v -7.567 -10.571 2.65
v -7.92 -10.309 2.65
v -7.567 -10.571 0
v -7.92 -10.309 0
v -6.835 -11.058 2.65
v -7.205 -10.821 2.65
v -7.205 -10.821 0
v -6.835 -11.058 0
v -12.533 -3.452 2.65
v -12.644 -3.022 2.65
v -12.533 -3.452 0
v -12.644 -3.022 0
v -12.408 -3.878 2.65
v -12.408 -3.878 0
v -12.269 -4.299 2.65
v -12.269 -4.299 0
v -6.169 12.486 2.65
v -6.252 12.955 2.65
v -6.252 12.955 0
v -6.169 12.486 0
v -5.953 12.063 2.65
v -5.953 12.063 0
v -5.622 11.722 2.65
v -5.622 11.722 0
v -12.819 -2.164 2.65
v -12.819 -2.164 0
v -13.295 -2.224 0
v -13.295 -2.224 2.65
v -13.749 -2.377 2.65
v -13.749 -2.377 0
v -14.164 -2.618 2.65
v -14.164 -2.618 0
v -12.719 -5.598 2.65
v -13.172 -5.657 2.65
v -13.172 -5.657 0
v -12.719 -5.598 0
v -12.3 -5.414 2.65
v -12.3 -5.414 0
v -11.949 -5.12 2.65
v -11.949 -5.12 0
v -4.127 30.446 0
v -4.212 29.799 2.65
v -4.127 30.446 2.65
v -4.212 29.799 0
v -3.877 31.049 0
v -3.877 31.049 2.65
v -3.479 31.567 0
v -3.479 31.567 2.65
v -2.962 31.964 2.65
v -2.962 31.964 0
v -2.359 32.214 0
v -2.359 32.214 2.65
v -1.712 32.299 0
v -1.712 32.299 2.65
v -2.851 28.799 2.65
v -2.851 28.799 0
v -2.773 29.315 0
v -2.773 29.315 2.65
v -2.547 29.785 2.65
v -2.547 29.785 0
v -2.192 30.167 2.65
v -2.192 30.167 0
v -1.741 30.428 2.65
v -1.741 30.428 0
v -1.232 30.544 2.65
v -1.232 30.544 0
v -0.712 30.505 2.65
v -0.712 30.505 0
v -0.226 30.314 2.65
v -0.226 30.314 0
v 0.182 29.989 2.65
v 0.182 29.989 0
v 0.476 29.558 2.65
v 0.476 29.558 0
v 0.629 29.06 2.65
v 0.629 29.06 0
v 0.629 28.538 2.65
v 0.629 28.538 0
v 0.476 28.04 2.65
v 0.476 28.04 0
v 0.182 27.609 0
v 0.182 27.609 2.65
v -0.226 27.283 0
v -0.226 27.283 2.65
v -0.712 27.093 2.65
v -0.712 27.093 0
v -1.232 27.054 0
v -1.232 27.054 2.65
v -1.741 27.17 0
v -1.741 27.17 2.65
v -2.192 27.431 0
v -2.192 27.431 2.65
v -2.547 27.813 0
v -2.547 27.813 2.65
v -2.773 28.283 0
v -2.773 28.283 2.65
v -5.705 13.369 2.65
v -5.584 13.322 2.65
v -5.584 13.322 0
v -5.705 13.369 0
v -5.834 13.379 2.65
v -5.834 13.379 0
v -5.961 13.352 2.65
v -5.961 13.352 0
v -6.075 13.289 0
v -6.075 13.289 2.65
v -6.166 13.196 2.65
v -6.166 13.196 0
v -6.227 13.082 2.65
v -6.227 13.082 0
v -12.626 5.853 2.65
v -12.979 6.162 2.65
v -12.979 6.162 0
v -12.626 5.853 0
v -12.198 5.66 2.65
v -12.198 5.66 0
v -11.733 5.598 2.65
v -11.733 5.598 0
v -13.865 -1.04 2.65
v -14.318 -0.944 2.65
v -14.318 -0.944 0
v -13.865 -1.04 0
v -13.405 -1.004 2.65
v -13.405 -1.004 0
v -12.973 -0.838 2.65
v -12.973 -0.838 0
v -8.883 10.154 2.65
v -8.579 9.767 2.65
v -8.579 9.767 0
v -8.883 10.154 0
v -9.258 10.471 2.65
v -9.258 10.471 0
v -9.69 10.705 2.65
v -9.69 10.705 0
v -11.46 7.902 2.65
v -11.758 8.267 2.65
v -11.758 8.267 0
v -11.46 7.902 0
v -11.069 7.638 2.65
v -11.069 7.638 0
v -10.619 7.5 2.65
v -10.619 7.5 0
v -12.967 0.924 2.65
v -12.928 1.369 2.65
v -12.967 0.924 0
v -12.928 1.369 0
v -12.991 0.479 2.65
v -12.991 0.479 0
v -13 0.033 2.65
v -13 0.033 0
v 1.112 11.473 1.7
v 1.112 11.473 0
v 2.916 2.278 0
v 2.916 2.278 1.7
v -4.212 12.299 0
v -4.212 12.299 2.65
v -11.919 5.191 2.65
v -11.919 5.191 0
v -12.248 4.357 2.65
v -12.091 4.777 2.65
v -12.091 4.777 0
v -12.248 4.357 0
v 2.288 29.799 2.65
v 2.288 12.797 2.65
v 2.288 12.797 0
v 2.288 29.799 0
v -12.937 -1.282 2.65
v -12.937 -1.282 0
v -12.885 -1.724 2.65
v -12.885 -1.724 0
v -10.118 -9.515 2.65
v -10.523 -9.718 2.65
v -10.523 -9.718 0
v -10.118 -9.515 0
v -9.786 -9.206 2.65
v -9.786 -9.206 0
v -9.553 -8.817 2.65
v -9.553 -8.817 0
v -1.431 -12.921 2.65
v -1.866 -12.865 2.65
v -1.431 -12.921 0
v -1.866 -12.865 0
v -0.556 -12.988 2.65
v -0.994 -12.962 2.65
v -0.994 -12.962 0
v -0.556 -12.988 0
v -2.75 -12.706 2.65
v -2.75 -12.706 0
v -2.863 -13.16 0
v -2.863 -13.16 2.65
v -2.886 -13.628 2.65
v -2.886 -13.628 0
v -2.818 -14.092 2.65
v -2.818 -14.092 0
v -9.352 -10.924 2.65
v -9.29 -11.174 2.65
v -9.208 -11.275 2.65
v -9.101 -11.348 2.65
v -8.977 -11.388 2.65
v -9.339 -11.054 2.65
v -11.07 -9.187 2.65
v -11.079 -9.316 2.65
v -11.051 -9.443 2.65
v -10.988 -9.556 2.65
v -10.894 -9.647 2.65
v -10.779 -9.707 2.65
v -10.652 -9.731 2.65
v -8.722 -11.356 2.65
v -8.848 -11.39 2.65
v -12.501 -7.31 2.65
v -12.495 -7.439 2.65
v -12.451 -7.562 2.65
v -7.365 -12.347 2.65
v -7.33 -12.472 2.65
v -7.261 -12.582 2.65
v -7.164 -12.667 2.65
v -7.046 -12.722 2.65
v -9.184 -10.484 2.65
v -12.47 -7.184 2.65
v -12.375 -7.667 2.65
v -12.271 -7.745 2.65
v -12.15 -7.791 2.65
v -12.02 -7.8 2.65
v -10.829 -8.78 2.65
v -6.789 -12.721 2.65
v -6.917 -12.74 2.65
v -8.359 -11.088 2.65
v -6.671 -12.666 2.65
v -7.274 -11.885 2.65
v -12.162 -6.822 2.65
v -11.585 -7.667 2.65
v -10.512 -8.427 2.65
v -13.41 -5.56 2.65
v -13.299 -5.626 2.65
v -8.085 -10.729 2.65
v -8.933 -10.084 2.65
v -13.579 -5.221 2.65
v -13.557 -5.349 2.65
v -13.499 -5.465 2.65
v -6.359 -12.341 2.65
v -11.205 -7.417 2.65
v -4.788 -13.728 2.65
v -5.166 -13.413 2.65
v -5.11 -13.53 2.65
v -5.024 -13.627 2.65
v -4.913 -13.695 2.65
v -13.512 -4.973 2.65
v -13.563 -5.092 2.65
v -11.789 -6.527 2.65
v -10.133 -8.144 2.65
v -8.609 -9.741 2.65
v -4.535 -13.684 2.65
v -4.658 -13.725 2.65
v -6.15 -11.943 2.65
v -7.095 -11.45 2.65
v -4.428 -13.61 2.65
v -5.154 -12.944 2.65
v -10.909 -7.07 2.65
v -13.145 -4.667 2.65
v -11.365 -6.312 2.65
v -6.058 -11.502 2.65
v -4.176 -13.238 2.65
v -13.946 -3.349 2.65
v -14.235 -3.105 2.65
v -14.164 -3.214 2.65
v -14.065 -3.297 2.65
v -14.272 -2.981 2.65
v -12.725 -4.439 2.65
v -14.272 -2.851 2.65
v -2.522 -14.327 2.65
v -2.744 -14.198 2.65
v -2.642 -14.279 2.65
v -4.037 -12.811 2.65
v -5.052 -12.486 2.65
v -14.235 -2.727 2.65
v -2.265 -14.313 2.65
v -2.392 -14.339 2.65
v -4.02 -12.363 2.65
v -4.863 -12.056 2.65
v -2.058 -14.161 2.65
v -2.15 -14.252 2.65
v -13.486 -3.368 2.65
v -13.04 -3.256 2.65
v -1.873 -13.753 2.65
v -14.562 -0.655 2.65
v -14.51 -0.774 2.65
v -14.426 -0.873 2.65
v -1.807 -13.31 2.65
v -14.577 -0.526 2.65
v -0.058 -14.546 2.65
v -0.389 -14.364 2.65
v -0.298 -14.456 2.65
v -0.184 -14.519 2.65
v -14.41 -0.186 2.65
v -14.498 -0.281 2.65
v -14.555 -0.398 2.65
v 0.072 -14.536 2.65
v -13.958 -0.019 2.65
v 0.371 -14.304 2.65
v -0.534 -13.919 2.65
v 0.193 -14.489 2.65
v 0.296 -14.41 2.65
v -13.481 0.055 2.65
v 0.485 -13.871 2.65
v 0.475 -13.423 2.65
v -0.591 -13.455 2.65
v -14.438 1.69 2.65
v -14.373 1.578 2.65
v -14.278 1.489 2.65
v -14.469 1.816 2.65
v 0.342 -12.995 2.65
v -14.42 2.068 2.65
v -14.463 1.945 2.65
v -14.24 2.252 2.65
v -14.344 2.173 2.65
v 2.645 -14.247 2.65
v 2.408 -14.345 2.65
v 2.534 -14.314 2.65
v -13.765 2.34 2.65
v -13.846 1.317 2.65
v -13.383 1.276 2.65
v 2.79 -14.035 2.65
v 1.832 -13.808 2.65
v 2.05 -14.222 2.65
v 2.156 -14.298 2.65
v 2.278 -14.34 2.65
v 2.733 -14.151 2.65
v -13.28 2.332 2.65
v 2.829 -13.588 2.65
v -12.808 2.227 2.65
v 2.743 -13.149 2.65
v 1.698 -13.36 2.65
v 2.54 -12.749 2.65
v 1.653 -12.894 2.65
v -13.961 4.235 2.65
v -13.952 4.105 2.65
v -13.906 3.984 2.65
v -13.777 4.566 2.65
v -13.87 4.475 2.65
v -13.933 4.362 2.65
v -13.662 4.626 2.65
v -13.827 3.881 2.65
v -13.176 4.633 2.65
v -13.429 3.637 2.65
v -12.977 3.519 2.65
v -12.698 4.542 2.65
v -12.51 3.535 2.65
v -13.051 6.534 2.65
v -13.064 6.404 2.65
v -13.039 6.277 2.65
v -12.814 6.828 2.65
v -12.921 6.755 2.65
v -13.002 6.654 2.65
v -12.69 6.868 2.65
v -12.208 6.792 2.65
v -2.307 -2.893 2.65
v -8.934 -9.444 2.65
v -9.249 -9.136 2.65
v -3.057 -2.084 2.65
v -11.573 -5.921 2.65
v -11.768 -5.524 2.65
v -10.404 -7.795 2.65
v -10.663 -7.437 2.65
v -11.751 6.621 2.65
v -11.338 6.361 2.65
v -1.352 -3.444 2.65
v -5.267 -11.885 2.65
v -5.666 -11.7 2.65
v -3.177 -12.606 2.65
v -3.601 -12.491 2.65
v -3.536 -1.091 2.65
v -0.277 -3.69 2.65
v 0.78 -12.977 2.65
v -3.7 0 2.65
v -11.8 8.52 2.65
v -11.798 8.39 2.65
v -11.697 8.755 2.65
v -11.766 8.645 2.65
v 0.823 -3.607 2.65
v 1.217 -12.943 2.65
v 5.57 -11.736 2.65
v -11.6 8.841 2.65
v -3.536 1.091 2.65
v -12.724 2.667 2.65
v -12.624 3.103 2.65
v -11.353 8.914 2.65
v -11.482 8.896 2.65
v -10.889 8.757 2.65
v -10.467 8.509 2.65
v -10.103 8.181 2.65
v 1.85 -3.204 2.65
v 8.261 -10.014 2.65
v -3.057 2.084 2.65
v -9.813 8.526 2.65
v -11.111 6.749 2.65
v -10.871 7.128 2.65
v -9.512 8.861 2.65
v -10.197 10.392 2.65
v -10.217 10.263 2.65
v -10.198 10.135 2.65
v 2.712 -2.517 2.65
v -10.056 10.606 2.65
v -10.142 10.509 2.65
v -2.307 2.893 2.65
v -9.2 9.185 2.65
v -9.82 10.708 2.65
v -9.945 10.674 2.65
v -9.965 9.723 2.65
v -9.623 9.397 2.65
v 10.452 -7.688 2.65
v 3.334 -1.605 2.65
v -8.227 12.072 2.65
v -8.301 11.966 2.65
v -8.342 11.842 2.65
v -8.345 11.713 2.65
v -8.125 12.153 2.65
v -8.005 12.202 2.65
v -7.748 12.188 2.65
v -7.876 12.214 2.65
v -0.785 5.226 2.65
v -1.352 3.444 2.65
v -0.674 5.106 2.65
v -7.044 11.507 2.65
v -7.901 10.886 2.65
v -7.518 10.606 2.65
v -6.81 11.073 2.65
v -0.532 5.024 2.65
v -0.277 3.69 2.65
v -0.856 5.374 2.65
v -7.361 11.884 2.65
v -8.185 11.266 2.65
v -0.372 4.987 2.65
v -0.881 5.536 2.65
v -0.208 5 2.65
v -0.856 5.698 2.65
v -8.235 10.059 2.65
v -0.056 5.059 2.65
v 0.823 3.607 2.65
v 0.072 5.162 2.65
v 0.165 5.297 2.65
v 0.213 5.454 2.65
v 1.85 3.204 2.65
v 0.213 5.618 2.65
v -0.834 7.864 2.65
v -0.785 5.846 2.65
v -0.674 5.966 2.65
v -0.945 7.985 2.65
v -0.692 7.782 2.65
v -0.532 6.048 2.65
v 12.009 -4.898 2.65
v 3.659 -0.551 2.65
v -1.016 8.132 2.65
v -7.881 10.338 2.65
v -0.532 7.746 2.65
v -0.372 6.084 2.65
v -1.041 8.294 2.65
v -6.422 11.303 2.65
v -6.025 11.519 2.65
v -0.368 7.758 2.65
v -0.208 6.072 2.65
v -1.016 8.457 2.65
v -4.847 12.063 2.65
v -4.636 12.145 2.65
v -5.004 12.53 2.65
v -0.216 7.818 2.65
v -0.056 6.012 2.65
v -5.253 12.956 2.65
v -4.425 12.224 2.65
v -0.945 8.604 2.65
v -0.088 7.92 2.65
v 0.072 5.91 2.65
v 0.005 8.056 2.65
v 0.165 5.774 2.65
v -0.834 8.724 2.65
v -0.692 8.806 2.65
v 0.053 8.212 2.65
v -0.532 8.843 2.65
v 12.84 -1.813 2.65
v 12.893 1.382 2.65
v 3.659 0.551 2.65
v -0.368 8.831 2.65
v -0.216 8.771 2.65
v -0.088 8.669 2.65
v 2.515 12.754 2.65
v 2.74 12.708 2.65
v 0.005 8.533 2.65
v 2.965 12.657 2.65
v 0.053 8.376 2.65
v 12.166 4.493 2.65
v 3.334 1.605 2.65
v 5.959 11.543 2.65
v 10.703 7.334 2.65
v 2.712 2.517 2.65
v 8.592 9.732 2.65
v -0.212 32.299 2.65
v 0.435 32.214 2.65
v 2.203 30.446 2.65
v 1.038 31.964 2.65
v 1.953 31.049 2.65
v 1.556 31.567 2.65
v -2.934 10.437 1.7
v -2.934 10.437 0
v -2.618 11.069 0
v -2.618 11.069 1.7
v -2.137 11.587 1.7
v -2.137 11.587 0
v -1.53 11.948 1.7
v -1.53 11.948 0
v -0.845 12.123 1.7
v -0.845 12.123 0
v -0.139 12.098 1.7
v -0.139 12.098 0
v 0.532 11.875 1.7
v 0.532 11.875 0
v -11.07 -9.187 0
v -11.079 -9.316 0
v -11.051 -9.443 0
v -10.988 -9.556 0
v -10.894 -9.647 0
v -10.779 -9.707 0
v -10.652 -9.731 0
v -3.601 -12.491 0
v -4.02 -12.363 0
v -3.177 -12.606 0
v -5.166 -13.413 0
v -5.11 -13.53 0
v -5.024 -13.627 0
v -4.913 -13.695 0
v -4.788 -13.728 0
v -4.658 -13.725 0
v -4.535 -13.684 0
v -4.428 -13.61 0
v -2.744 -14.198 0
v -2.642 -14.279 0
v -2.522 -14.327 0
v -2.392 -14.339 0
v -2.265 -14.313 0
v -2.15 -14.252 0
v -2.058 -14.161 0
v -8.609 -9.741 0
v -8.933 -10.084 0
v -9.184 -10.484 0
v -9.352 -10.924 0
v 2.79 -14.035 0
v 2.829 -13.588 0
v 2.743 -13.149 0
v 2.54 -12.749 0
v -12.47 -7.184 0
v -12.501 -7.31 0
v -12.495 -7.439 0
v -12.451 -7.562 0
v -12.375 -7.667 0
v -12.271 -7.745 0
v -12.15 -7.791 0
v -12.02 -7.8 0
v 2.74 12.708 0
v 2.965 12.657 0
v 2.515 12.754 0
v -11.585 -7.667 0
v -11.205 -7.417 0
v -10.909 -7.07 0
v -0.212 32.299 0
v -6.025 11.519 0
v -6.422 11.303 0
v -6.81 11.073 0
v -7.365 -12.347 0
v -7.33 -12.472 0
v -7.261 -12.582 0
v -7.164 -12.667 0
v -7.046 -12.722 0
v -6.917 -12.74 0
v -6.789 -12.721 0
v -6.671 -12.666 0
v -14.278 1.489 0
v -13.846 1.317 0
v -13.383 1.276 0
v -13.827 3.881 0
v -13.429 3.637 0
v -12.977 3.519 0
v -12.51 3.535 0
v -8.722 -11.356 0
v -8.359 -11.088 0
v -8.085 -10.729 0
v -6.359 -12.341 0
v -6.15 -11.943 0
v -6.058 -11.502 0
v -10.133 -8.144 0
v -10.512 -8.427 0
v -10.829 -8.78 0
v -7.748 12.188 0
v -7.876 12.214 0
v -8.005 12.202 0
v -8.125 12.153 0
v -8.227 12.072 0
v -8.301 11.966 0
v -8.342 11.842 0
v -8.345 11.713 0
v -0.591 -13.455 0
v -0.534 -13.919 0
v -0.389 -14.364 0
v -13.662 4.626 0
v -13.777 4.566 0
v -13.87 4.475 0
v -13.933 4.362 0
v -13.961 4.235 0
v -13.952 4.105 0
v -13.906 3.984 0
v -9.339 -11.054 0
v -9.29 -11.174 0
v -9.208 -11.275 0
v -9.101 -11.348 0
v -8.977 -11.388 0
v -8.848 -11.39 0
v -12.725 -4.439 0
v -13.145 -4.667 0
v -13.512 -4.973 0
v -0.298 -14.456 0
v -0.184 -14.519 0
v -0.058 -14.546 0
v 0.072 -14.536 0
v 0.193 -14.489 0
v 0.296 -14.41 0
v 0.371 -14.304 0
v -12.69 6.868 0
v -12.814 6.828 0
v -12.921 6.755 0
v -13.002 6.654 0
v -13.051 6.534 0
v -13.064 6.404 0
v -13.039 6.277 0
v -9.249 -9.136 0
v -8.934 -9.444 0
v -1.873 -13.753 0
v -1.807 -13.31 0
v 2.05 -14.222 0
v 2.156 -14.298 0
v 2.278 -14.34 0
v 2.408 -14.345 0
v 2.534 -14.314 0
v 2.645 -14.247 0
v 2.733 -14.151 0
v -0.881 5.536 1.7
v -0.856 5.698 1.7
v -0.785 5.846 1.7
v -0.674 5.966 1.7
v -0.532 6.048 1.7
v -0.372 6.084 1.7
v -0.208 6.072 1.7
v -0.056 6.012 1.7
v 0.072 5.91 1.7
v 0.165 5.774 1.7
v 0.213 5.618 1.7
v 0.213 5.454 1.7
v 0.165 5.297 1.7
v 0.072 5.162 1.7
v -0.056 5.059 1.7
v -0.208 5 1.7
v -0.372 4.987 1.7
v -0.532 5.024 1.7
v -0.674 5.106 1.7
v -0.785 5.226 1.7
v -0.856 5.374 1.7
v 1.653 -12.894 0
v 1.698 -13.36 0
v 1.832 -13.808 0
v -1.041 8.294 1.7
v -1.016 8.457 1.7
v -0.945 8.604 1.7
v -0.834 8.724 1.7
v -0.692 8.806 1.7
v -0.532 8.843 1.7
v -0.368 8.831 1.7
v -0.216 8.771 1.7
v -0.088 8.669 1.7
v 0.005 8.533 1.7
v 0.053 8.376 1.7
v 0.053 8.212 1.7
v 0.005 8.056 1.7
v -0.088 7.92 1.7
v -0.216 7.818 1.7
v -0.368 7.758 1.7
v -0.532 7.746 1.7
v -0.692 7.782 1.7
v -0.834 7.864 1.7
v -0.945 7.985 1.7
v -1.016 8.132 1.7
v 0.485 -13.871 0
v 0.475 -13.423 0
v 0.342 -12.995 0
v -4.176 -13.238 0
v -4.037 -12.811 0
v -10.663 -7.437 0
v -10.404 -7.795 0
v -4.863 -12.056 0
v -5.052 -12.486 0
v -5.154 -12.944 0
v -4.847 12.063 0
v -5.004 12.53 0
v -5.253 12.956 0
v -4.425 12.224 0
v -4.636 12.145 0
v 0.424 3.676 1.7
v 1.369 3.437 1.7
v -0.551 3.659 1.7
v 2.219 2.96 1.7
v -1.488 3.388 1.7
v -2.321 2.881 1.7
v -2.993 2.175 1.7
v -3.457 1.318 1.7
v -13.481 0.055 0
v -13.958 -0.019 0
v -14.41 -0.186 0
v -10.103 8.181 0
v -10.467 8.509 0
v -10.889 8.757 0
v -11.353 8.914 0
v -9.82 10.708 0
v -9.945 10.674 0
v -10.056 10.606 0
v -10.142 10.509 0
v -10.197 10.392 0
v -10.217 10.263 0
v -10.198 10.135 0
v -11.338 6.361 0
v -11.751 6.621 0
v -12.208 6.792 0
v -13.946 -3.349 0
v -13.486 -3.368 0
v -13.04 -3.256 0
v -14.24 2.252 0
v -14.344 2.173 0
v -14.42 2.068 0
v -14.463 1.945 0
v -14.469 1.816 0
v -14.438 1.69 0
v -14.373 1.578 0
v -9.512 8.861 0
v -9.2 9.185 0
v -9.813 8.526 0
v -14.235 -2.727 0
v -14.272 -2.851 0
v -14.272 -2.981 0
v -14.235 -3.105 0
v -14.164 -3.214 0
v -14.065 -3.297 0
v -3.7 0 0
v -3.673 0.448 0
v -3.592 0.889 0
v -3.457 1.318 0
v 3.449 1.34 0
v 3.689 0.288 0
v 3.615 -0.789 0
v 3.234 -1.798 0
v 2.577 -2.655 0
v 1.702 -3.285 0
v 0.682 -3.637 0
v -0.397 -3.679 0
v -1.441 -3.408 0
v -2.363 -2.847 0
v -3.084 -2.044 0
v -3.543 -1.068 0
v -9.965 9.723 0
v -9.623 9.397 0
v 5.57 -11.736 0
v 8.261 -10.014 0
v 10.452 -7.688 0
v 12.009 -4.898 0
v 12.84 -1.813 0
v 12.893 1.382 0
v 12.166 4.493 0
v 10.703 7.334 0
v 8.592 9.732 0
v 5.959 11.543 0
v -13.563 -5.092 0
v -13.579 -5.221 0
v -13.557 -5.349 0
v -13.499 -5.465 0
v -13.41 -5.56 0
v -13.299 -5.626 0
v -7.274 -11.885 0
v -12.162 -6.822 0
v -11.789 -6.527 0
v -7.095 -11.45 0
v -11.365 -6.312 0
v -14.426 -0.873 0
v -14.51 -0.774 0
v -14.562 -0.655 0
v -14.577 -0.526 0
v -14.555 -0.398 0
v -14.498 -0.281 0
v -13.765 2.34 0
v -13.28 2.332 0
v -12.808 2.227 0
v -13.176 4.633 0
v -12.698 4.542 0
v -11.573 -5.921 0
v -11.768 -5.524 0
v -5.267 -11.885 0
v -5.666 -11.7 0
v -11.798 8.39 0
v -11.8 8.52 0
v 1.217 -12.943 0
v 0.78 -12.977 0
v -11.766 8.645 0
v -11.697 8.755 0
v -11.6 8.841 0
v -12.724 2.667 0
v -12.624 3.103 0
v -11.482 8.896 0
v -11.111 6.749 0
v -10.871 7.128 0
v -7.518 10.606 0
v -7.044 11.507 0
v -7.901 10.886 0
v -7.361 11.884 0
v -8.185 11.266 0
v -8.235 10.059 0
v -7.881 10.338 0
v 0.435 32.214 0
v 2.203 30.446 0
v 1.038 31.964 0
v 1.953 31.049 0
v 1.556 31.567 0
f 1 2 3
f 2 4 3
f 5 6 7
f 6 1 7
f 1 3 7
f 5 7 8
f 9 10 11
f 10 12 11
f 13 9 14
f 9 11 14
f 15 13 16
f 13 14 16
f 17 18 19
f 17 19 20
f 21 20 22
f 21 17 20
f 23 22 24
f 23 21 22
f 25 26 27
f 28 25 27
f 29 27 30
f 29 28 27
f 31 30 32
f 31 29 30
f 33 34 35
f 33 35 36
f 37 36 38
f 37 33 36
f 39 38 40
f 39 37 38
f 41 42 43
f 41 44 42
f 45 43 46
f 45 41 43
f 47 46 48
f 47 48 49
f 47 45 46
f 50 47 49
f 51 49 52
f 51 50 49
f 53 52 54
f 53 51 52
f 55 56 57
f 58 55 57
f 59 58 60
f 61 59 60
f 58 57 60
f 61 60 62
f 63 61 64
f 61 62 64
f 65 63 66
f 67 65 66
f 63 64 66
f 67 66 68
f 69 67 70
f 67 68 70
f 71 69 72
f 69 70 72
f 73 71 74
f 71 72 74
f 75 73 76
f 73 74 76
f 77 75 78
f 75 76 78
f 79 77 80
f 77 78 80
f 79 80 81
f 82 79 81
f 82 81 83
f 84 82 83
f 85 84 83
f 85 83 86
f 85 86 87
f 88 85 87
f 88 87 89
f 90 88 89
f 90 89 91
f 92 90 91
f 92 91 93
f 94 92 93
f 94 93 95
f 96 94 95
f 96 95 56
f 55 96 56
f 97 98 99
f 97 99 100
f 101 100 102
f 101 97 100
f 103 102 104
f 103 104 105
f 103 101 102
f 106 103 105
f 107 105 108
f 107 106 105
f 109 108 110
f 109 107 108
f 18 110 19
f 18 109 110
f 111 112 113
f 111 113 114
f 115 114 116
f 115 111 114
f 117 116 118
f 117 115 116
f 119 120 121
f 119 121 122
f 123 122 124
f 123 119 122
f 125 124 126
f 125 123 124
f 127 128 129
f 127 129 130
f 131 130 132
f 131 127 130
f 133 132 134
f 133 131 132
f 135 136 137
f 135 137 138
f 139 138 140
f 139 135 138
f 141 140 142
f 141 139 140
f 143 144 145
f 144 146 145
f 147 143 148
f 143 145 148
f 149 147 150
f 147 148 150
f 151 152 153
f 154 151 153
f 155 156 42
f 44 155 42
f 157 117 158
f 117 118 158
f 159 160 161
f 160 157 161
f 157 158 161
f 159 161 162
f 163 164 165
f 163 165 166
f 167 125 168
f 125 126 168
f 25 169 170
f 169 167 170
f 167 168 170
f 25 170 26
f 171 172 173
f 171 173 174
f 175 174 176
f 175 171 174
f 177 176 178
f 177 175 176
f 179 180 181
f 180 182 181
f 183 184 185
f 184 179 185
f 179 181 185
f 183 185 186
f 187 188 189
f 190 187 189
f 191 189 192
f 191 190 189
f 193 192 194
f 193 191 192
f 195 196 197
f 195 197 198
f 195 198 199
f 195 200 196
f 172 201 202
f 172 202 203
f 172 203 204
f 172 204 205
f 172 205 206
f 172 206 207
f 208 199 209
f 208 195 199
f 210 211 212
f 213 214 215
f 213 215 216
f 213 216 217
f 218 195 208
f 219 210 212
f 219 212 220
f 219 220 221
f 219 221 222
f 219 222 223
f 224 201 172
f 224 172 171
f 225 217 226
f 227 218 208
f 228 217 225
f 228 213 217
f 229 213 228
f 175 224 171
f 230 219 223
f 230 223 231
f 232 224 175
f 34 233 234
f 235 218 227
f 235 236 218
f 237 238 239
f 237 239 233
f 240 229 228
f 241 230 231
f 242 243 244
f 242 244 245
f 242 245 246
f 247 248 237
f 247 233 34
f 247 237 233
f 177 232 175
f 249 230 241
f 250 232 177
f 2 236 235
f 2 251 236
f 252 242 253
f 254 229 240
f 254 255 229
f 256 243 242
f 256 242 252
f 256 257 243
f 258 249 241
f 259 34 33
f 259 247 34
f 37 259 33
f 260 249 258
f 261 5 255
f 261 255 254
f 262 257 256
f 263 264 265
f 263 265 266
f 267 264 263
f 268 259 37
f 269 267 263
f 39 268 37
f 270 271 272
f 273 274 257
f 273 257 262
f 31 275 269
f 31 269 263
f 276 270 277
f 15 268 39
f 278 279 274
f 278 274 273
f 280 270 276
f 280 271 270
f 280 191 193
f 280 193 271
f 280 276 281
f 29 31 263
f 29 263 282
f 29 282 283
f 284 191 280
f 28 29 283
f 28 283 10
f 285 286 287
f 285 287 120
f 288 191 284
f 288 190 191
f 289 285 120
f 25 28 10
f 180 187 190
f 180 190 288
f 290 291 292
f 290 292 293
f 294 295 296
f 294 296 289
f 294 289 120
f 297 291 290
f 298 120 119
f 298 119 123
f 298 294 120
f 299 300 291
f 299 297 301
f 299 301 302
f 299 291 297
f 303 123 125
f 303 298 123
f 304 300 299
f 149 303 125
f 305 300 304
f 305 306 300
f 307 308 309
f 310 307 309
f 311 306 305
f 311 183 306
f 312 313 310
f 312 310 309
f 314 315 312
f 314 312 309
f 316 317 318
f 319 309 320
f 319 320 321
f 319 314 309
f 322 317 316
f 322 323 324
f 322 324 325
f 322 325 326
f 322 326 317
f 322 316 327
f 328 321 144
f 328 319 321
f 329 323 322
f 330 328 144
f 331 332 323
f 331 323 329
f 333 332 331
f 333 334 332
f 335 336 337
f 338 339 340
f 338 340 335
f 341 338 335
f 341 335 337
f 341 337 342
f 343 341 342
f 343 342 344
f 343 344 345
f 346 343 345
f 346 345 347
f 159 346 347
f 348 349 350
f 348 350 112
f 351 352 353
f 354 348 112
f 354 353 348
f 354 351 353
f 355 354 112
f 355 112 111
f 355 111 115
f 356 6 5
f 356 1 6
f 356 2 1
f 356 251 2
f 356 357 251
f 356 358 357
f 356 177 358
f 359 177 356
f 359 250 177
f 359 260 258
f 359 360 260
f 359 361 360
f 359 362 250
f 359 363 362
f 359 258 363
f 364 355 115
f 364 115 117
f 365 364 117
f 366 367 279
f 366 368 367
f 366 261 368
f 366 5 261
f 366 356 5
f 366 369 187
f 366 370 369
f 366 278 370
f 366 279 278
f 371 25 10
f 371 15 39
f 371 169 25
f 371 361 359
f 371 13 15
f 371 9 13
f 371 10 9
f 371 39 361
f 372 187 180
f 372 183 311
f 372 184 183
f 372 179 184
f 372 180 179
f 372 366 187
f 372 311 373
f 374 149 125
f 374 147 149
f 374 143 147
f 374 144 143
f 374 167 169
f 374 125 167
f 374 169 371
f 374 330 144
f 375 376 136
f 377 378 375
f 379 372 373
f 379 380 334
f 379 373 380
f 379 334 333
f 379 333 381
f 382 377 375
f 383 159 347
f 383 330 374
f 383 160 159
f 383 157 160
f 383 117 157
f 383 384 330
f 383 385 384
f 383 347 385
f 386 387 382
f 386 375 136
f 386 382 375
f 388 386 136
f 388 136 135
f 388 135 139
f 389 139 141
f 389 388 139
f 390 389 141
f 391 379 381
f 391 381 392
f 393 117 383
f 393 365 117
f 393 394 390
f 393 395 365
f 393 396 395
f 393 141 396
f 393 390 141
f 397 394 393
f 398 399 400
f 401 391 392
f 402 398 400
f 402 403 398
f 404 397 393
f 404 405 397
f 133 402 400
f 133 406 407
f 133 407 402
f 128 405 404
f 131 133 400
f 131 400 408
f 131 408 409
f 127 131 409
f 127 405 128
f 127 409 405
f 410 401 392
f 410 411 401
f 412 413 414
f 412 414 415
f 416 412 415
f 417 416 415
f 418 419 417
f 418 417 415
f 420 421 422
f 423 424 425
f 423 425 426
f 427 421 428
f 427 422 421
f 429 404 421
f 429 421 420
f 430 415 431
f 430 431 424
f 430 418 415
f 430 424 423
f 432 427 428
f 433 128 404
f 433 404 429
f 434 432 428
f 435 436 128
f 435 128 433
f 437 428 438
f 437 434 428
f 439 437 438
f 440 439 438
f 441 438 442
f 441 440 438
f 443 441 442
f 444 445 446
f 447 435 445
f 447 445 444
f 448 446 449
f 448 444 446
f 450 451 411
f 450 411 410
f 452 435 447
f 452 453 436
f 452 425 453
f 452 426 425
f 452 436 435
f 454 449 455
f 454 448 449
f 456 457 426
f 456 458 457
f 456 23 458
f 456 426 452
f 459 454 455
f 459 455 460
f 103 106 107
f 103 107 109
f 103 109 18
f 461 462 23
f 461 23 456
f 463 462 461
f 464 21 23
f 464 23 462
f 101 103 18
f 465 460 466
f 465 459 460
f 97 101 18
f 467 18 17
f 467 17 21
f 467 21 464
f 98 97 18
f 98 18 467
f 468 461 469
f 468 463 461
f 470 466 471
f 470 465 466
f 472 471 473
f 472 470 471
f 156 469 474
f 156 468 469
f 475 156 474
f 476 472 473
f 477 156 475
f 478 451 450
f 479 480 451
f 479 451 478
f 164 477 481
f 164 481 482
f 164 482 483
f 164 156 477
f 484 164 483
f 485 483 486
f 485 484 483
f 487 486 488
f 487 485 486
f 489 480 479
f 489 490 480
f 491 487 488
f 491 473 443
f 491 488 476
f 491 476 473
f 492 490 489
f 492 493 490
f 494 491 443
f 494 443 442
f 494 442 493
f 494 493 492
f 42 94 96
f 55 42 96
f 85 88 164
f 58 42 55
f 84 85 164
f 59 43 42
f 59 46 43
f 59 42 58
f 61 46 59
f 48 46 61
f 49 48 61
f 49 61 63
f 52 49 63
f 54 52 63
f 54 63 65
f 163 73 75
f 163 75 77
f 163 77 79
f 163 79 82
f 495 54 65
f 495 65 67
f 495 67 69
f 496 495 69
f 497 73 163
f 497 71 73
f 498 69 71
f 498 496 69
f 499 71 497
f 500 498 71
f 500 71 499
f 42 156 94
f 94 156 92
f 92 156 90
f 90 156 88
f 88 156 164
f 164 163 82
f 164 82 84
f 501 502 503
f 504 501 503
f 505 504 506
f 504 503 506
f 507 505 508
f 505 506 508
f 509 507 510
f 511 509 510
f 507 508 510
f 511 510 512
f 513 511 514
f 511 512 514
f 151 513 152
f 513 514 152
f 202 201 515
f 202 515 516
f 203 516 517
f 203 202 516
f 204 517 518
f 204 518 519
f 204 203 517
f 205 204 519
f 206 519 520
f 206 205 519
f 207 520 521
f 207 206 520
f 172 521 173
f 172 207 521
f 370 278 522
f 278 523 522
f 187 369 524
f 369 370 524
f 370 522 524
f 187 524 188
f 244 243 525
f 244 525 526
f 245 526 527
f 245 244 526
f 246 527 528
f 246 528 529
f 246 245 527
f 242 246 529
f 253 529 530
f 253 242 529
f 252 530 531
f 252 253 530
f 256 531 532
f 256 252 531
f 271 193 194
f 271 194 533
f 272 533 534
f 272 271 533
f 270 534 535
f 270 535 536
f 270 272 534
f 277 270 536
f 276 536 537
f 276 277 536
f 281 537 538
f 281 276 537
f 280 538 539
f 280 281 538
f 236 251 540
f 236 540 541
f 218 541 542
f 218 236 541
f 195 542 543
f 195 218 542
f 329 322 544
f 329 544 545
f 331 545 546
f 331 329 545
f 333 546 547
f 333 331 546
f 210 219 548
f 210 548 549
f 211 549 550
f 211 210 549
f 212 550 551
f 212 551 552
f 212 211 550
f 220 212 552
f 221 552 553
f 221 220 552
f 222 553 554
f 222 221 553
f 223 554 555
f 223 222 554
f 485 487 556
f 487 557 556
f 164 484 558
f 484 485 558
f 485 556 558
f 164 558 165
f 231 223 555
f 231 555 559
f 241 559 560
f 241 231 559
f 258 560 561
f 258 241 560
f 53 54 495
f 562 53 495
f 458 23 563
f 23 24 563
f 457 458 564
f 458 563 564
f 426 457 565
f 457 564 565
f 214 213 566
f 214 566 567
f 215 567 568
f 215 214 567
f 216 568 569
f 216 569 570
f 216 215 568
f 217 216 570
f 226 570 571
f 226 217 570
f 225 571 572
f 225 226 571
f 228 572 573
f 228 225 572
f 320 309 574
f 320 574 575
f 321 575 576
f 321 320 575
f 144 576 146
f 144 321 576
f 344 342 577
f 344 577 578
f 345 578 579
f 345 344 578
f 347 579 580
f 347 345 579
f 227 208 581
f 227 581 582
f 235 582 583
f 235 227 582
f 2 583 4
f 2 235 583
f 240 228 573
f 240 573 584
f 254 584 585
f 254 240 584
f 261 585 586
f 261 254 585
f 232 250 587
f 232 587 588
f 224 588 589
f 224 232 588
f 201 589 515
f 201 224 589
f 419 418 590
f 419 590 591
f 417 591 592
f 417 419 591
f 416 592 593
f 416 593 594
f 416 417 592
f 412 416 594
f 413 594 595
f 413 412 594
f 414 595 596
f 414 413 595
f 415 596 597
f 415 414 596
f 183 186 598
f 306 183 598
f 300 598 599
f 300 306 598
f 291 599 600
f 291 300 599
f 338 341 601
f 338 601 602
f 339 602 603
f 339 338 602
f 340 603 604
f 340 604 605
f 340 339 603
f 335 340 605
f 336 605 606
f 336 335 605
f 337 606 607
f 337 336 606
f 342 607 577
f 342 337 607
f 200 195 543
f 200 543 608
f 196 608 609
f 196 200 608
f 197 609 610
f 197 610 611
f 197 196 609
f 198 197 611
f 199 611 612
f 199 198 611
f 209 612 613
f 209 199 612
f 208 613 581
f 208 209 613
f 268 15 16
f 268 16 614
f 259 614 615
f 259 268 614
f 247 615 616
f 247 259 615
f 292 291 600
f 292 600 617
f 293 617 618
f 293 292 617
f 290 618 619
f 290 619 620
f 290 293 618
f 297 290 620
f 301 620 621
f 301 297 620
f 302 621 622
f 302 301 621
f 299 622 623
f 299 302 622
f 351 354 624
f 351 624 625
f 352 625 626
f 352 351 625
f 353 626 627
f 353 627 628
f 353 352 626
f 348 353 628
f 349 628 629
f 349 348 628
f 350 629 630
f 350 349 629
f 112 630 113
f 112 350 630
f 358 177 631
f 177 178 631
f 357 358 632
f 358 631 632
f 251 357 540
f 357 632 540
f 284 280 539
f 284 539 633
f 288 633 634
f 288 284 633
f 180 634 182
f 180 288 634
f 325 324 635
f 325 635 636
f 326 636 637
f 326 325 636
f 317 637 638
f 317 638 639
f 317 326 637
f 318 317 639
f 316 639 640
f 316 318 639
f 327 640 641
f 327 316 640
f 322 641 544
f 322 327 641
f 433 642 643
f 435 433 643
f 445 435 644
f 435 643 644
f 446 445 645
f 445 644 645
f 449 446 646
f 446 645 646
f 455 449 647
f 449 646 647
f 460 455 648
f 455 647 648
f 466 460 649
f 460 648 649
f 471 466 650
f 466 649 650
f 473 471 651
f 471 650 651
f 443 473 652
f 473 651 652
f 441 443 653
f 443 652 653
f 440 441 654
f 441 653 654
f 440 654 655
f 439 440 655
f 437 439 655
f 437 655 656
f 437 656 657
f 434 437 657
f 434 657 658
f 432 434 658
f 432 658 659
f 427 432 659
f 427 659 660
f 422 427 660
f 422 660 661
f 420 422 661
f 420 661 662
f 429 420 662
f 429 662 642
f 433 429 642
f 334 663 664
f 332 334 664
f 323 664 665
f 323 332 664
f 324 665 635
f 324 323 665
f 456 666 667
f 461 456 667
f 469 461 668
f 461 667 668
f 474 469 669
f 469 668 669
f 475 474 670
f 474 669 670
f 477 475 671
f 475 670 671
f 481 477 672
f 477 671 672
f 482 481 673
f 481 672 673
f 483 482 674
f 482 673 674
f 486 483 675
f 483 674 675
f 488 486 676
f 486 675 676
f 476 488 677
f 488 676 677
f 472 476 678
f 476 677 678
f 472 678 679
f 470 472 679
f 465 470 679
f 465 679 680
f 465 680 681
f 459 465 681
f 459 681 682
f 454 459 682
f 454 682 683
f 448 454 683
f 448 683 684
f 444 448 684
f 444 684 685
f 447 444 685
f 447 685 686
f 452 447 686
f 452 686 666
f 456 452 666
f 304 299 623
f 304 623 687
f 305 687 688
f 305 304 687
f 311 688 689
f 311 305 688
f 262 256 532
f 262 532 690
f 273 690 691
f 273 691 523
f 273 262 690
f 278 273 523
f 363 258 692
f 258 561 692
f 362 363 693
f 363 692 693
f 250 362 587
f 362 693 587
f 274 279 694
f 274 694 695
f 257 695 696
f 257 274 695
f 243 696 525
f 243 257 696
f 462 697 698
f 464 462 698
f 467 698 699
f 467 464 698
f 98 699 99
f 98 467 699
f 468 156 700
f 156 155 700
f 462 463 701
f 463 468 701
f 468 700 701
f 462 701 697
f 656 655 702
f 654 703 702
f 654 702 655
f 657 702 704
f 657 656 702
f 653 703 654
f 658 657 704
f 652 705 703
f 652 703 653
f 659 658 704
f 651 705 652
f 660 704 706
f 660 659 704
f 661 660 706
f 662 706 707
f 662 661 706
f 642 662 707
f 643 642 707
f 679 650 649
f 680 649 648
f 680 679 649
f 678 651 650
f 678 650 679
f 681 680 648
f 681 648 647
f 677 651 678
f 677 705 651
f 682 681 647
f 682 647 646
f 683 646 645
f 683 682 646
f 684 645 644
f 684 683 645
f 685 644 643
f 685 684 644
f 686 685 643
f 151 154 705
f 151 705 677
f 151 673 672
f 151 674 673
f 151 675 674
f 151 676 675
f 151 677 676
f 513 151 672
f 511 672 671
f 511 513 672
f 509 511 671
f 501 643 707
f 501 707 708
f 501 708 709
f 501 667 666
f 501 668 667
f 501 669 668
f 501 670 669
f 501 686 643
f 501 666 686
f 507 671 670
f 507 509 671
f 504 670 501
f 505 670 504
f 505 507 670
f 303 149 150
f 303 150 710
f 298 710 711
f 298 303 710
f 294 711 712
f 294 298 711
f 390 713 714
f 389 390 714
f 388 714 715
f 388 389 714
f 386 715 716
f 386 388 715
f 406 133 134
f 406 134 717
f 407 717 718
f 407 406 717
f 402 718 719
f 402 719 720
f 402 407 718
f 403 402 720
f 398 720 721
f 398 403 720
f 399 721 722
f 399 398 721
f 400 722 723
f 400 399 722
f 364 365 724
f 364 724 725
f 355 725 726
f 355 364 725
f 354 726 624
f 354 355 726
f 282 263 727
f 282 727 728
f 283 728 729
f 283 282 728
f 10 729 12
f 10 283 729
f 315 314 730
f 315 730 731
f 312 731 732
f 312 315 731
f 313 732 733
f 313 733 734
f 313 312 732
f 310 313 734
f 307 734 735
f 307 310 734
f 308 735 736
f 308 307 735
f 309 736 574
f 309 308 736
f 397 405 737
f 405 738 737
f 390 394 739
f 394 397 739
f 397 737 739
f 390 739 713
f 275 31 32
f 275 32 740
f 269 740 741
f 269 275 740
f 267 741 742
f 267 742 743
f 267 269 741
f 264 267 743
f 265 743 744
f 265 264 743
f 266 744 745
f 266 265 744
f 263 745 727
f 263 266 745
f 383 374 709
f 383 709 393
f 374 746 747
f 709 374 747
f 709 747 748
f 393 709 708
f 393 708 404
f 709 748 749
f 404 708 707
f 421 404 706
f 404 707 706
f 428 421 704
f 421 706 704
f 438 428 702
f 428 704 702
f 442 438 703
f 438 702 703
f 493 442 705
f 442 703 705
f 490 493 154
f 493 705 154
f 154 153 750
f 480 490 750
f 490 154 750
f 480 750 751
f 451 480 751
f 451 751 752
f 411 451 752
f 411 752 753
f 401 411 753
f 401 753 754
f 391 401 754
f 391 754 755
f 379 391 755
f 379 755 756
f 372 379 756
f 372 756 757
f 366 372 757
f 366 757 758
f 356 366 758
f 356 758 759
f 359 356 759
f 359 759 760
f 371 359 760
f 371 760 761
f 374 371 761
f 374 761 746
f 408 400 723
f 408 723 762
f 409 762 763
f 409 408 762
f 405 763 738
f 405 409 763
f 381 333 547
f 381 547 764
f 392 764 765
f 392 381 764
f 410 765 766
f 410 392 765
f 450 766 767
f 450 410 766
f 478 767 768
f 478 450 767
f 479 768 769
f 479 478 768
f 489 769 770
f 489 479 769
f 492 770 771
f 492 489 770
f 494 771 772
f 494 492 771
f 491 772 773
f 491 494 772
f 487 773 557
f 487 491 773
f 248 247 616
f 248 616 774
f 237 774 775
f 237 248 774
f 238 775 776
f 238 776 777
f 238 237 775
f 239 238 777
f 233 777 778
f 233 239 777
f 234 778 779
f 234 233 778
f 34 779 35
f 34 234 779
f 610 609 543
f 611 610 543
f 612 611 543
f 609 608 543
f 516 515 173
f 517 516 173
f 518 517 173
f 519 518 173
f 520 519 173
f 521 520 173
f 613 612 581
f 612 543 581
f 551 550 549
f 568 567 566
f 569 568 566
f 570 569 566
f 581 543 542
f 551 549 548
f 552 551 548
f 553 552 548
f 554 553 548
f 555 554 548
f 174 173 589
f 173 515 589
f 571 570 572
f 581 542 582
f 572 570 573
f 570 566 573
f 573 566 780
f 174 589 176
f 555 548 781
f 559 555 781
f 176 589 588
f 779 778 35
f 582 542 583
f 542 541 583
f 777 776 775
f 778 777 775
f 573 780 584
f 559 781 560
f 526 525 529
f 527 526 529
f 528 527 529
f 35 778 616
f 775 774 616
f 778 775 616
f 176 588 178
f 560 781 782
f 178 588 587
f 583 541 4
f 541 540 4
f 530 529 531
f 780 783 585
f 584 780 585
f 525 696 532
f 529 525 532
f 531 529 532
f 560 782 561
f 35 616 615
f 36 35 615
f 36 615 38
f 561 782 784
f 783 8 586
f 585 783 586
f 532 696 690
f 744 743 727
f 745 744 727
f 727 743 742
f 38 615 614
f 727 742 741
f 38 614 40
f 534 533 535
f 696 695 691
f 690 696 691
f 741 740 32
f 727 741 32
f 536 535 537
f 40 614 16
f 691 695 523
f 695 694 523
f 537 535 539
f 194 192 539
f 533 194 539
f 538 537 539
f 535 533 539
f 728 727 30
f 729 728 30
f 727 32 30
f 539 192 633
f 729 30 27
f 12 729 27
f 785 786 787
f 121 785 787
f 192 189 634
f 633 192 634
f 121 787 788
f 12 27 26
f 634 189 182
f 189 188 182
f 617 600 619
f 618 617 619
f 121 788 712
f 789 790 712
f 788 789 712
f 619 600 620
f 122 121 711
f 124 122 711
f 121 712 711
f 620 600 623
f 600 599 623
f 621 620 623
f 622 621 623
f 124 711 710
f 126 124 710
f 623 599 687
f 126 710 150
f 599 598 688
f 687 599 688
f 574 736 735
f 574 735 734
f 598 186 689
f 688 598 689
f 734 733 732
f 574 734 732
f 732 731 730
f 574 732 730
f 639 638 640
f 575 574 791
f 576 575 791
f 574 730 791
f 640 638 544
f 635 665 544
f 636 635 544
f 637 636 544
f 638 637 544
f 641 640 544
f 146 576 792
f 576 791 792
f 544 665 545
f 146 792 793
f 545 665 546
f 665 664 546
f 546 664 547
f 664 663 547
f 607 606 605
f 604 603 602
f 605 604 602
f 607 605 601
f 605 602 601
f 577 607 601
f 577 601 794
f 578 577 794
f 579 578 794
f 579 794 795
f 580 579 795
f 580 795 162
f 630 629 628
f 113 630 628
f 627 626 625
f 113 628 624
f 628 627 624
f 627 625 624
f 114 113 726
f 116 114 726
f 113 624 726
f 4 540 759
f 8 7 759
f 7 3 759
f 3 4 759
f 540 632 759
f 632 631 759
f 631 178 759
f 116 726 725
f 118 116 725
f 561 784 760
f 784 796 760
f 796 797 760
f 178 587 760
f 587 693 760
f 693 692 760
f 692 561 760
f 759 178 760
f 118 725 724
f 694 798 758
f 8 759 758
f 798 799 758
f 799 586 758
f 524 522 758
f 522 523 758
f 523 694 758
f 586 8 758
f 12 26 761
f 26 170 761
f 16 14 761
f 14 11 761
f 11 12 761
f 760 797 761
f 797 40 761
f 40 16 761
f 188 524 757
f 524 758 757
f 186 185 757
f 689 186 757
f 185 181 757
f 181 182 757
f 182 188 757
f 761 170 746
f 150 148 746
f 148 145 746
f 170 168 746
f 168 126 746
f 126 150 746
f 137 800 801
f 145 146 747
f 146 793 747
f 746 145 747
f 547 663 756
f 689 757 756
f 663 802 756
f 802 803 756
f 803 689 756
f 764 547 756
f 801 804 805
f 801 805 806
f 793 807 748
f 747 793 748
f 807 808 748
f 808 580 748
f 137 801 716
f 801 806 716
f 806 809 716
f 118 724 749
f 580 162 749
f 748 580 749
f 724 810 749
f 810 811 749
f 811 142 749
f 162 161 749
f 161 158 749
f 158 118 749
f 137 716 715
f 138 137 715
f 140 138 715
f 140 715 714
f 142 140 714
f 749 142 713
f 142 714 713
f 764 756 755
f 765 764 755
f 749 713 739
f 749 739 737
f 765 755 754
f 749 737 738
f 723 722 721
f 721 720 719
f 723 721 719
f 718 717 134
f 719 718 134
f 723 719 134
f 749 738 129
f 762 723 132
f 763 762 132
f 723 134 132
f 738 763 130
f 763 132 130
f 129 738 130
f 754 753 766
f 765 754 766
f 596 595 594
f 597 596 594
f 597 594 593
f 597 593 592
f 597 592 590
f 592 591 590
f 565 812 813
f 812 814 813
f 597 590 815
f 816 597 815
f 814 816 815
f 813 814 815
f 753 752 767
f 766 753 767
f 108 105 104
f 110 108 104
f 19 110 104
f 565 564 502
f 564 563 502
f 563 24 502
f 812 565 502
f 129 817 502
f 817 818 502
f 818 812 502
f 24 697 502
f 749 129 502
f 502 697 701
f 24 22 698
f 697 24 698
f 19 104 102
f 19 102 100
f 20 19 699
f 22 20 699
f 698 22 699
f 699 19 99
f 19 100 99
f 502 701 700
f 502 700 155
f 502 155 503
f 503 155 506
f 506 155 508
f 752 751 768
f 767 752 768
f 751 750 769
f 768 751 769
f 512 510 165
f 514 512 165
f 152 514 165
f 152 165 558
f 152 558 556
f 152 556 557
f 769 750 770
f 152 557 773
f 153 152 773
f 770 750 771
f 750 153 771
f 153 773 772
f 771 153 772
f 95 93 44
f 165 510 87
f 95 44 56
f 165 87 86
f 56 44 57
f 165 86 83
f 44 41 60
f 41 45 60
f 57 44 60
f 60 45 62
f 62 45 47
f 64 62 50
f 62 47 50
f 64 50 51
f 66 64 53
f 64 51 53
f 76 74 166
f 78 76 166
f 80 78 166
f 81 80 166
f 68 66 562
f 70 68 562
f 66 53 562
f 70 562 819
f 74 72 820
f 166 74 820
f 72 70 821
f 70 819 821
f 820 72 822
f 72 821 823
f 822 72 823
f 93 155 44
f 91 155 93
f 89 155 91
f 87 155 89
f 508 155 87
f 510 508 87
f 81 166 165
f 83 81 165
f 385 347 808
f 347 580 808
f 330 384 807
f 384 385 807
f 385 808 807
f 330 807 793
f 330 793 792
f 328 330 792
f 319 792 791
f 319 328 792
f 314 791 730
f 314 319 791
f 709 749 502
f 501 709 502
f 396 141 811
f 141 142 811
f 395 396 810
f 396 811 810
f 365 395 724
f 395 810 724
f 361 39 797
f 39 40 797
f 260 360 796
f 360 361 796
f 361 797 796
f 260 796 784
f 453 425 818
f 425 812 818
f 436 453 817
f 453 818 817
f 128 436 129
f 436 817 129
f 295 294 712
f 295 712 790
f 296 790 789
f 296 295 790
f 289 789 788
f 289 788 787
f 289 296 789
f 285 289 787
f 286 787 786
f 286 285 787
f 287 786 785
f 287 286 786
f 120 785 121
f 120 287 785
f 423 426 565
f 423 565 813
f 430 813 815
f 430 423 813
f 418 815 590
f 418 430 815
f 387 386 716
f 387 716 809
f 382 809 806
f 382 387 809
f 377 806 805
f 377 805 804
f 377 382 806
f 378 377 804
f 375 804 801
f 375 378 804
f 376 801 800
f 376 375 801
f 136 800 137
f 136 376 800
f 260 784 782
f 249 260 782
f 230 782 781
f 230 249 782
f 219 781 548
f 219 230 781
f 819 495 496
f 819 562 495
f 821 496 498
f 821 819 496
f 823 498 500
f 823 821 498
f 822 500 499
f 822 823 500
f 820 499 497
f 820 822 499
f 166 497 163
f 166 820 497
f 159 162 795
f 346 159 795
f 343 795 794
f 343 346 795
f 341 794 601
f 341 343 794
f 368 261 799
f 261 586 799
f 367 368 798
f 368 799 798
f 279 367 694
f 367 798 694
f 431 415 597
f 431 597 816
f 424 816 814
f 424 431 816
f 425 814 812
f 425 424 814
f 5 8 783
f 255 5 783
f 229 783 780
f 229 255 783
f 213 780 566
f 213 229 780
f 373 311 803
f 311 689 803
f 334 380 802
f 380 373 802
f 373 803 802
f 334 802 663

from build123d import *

# Parameters (mm, degrees)
SKETCH1_R           = 13
BOSS_EXTRUDE1_DEPTH = 2.65
BOSS_EXTRUDE2_DEPTH = 2.65
CIRPATTERN1_COUNT   = 37
CUT_EXTRUDE1_DEPTH  = 6
SKETCH5_W           = 6.5
SKETCH5_H           = 20
BOSS_EXTRUDE3_DEPTH = 2.65
FILLET1_R           = 2.5
SKETCH6_R           = 3.7
CUT_EXTRUDE2_DEPTH  = 36.535053909
SKETCH8_R           = 1.75
CUT_EXTRUDE4_DEPTH  = 36.535053909
CUT_EXTRUDE5_DEPTH  = 1.7
SKETCH9_R           = 0.55
CUT_EXTRUDE6_DEPTH  = 36.476859448


with BuildPart() as part:
    # Sketch1 → Boss-Extrude1 (new body)
    with BuildSketch(Plane.XY):
        Circle(SKETCH1_R)
    extrude(amount=BOSS_EXTRUDE1_DEPTH)

    # Sketch2 → Boss-Extrude2 (add)
    with BuildSketch(Plane.XY.offset(2.65)):
        with BuildLine():
            Line((-1.407237761, 12.923609476), (-0.564746485, 12.987727338))
            ThreePointArc((-0.564746485, 12.987727338), (-0.590917928, 13.726605325), (-0.839716114, 14.422827334))
            ThreePointArc((-0.839716114, 14.422827334), (-1.250735375, 14.570045044), (-1.59276063, 14.298699117))
            ThreePointArc((-1.59276063, 14.298699117), (-1.655805876, 13.590133338), (-1.407237761, 12.923609476))
        make_face()
    boss_extrude2 = extrude(amount=-BOSS_EXTRUDE2_DEPTH)

    # CirPattern1: Boss-Extrude2 ×37 about axis
    cirpattern1_axis = Axis((-0.00317711, 0.03890501, 0), (0, 0, 1))
    for i in range(1, CIRPATTERN1_COUNT):
        add(boss_extrude2.rotate(cirpattern1_axis, i * 360 / CIRPATTERN1_COUNT))

    # Sketch3 → Cut-Extrude1 (cut)
    with BuildSketch(Plane.XY.offset(2.65)):
        with BuildLine():
            ThreePointArc((2.539809494, -12.749484999), (12.964979242, -0.216908767), (2.964875647, 12.657389636))
            ThreePointArc((2.964875647, 12.657389636), (2.750073389, 13.993219942), (3.542759924, 15.089682744))
            ThreePointArc((3.542759924, 15.089682744), (15.464629435, -0.258728814), (3.036006853, -15.199747879))
            ThreePointArc((3.036006853, -15.199747879), (3.295374232, -13.871850601), (2.539809494, -12.749484999))
        make_face()
    extrude(amount=-CUT_EXTRUDE1_DEPTH, mode=Mode.SUBTRACT)

    # Sketch5 → Boss-Extrude3 (add)
    with BuildSketch(Plane.XY.offset(2.65)):
        with Locations((-0.96169727, 22.298845722)):
            Rectangle(SKETCH5_W, SKETCH5_H)
    extrude(amount=-BOSS_EXTRUDE3_DEPTH)

    # Fillet1
    fillet1_edges = [part.edges().sort_by_distance(p)[0] for p in [
        (2.28830273, 32.298845722, 1.325),
        (-4.21169727, 32.298845722, 1.325),
    ]]
    fillet(fillet1_edges, radius=FILLET1_R)

    # Sketch6 → Cut-Extrude2 (cut, through all)
    with BuildSketch(Plane(origin=(0, 0, 0), x_dir=(-1, 0, 0), z_dir=(0, 0, -1))):
        Circle(SKETCH6_R)
    extrude(amount=-CUT_EXTRUDE2_DEPTH, mode=Mode.SUBTRACT)

    # Sketch8 → Cut-Extrude4 (cut, through all)
    with BuildSketch(Plane(origin=(0, 0, 0), x_dir=(-1, 0, 0), z_dir=(0, 0, -1))):
        with Locations((1.101176672, 28.798845722)):
            Circle(SKETCH8_R)
    extrude(amount=-CUT_EXTRUDE4_DEPTH, mode=Mode.SUBTRACT)

    # Sketch7 → Cut-Extrude5 (cut)
    with BuildSketch(Plane(origin=(0, 0, 0), x_dir=(-1, 0, 0), z_dir=(0, 0, -1))):
        with BuildLine():
            Line((3.457410227, 1.317692879), (2.9338417, 10.436920645))
            ThreePointArc((2.9338417, 10.436920645), (1.193583976, 12.06013788), (-1.112499205, 11.472505769))
            Line((-1.112499205, 11.472505769), (-2.915695151, 2.277876596))
            ThreePointArc((-2.915695151, 2.277876596), (0.551227719, 3.658708516), (3.457410227, 1.317692879))
        make_face()
    extrude(amount=-CUT_EXTRUDE5_DEPTH, mode=Mode.SUBTRACT)

    # Sketch9 → Cut-Extrude6 (cut, through all)
    with BuildSketch(Plane(origin=(0, 0, 1.7), x_dir=(-1, 0, 0), z_dir=(0, 0, -1))):
        with Locations((0.330807323, 5.53577119)):
            Circle(SKETCH9_R)
        with Locations((0.490803437, 8.294426445)):
            Circle(SKETCH9_R)
    extrude(amount=-CUT_EXTRUDE6_DEPTH, mode=Mode.SUBTRACT)


solid = part.part
